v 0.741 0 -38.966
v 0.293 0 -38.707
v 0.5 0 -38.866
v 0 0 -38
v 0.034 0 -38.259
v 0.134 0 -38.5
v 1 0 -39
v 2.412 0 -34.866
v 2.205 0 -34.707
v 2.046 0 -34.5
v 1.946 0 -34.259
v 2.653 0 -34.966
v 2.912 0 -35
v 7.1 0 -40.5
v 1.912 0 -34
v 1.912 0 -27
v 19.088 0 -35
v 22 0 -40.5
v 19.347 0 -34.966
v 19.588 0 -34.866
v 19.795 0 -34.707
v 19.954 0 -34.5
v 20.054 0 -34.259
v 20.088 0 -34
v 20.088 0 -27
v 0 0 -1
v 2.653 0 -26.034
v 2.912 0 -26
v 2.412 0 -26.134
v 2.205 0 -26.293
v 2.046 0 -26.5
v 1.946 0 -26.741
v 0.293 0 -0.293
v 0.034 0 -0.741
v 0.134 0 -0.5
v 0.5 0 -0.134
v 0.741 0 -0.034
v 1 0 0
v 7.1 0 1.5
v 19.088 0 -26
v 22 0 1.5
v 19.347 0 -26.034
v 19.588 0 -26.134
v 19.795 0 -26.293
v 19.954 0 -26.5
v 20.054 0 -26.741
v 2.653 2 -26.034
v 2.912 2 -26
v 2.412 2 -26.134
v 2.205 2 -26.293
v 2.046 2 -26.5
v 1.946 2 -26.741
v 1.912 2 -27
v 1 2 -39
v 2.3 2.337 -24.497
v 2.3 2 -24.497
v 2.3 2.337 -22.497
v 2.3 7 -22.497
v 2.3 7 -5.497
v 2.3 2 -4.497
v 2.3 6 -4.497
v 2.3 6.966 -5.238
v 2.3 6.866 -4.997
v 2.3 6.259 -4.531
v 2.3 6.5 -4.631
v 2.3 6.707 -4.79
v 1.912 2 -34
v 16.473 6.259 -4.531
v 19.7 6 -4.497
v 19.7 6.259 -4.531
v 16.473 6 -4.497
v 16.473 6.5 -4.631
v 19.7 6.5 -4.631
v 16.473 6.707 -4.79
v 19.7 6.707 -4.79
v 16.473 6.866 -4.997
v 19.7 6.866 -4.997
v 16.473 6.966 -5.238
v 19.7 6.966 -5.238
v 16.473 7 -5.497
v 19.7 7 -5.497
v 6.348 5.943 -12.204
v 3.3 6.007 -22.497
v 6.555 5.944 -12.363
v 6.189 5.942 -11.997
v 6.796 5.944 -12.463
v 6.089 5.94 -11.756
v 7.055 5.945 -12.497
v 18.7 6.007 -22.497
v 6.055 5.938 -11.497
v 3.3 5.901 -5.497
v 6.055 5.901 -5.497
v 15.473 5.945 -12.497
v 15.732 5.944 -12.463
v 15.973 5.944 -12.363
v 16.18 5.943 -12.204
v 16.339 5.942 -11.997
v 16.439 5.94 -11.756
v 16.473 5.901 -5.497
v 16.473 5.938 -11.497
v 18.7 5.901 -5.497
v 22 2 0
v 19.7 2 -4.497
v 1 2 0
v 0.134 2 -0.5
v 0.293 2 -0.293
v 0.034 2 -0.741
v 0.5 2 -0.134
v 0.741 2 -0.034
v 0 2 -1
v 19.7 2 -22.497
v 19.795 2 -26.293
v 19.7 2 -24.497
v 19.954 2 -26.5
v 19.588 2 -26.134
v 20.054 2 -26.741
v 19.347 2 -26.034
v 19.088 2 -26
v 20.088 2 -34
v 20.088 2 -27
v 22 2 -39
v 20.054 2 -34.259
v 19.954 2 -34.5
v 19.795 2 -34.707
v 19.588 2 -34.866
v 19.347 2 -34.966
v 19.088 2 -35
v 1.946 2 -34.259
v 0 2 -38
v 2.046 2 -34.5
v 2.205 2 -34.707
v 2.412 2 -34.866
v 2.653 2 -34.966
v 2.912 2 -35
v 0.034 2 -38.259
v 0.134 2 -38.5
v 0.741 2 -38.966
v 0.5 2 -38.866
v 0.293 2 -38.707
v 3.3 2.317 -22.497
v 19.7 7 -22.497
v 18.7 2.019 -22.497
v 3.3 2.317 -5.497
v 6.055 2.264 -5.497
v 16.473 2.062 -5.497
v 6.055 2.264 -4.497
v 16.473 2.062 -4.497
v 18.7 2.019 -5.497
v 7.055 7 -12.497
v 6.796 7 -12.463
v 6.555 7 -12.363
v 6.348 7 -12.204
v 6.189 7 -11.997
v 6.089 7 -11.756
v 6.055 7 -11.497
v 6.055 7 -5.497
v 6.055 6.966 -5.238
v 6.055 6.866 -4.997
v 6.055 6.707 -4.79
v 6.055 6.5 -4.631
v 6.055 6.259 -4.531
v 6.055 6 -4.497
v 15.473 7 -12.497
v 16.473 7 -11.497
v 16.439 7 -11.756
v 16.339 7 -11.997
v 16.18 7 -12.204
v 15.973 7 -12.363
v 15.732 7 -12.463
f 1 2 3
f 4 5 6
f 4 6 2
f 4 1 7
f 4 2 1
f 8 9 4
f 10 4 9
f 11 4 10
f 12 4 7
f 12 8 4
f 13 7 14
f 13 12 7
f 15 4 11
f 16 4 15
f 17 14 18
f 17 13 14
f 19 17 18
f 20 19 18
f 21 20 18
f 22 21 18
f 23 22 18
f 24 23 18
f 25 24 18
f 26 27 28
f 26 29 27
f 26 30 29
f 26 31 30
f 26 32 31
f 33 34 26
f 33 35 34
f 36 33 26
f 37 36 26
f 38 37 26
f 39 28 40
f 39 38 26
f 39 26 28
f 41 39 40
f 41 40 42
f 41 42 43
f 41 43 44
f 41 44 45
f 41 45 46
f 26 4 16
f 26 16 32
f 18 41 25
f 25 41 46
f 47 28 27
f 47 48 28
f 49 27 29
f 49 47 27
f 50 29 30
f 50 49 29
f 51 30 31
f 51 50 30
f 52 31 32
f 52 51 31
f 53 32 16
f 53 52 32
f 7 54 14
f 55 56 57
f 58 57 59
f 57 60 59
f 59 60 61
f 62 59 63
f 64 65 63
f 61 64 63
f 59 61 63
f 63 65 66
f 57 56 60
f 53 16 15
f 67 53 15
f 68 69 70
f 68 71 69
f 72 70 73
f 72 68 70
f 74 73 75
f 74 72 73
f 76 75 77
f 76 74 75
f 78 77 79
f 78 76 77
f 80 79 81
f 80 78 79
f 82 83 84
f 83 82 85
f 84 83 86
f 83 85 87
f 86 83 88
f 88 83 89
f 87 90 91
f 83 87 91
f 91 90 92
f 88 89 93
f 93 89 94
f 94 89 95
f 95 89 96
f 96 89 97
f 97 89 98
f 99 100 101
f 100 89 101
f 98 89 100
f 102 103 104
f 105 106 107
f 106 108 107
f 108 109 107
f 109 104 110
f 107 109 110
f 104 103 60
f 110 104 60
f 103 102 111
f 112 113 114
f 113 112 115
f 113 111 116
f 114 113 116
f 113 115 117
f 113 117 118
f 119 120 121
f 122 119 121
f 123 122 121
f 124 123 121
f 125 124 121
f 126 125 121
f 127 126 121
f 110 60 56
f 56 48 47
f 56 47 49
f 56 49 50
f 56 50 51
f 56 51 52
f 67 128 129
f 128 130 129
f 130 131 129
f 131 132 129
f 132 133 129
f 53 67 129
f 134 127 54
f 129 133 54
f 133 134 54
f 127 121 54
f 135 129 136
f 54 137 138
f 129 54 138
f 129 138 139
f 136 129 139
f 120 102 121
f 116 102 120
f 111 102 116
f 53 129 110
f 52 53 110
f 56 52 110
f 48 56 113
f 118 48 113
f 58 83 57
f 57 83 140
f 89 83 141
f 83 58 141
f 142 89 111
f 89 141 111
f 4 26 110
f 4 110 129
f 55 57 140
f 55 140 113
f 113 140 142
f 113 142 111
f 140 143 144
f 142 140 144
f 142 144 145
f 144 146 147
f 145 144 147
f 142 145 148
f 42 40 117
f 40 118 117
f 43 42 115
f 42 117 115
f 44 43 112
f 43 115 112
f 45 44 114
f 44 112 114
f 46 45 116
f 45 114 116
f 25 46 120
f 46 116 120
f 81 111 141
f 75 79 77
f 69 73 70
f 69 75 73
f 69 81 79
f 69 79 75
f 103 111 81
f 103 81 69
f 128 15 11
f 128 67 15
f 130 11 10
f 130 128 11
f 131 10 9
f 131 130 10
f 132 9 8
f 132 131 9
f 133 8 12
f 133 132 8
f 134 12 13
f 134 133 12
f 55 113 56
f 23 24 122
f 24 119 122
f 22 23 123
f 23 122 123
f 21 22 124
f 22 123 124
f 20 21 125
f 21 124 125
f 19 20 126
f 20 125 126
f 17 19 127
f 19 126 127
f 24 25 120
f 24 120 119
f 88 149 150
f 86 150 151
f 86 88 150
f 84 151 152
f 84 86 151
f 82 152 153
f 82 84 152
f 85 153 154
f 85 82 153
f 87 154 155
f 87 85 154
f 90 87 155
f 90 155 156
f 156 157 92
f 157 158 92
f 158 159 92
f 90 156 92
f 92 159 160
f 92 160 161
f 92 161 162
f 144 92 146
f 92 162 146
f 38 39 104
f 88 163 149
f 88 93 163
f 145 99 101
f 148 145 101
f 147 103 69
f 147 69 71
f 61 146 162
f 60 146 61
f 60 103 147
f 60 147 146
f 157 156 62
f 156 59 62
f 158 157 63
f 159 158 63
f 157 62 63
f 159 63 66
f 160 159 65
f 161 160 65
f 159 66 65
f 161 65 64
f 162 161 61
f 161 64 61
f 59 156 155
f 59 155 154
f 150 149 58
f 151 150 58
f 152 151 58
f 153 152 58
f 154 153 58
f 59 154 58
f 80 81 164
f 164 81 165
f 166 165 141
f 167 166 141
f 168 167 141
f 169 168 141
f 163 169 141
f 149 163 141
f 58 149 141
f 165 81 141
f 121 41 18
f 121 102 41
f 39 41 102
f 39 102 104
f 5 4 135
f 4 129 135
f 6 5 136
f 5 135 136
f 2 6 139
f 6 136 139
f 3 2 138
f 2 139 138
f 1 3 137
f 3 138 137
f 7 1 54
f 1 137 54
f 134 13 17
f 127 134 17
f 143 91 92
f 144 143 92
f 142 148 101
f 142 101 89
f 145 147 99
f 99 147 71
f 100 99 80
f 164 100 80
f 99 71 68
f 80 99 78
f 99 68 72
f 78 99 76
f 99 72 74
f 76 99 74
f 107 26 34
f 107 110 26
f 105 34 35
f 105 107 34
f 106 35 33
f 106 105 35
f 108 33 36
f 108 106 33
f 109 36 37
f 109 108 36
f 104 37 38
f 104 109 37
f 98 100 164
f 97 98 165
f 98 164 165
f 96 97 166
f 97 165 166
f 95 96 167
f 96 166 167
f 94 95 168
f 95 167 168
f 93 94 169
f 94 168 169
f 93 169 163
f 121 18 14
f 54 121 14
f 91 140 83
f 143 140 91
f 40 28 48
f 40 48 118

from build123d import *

# Parameters (mm, degrees)
CROQUIS1_W              = 22
CROQUIS1_H              = 39
CROQUIS1_W_2            = 18.17669517928964
CROQUIS1_H_2            = 8.999999999999996
SALIENTE_EXTRUIR1_DEPTH = 2
REDONDEO1_R             = 1
REDONDEO2_R             = 1
SALIENTE_EXTRUIR2_DEPTH = 5
SALIENTE_EXTRUIR4_DEPTH = 15.4
CORTAR_EXTRUIR2_DEPTH   = 8
REDONDEO3_R             = 1
SALIENTE_EXTRUIR5_DEPTH = 20.000000000000004
SALIENTE_EXTRUIR6_DEPTH = 14.9
SALIENTE_EXTRUIR7_DEPTH = 14.9
SALIENTE_EXTRUIR8_DEPTH = 2
CORTAR_EXTRUIR3_DEPTH   = 7
SALIENTE_EXTRUIR9_DEPTH = 2
CORTAR_EXTRUIR4_DEPTH   = 8


with BuildPart() as part:
    # Croquis1 → Saliente-Extruir1 (new body)
    with BuildSketch(Plane(origin=(0, 0, 0), x_dir=(1, 0, 0), z_dir=(0, 1, 0))):
        with Locations((11, 19.5)):
            Rectangle(CROQUIS1_W, CROQUIS1_H)
        with Locations((11.000000000000002, 30.5)):
            Rectangle(CROQUIS1_W_2, CROQUIS1_H_2, mode=Mode.SUBTRACT)
        Polygon((2.2999999999999914, 4.496684869244013), (19.7, 4.496684869244013), (19.7, 22.496684869244014), (18.7, 22.496684869244014), (18.7, 5.496684869244012), (3.299999999999997, 5.496684869244012), (3.299999999999997, 22.49668486924401), (2.2999999999999914, 22.49668486924401), align=None, mode=Mode.SUBTRACT)
    extrude(amount=SALIENTE_EXTRUIR1_DEPTH)

    # Redondeo1
    redondeo1_edges = [part.edges().sort_by_distance(p)[0] for p in [
        (0, 1, -39),
        (0, 1, 0),
    ]]
    fillet(redondeo1_edges, radius=REDONDEO1_R)

    # Redondeo2
    redondeo2_edges = [part.edges().sort_by_distance(p)[0] for p in [
        (1.9116524103551802, 1, -35),
        (1.9116524103551802, 1, -26.000000000000004),
        (20.088347589644822, 1, -26.000000000000004),
        (20.088347589644822, 1, -35),
    ]]
    fillet(redondeo2_edges, radius=REDONDEO2_R)



with BuildPart() as body_2:
    # Croquis8 → Saliente-Extruir2 (new body)
    with BuildSketch(Plane(origin=(0, 2, 0), x_dir=(1, 0, 0), z_dir=(0, 1, 0))):
        Polygon((2.2999999999999914, 22.49668486924401), (3.299999999999997, 22.49668486924401), (3.299999999999997, 5.496684869244012), (18.7, 5.496684869244012), (18.7, 22.496684869244014), (19.7, 22.496684869244014), (19.7, 4.496684869244013), (2.2999999999999914, 4.496684869244013), align=None)
    extrude(amount=SALIENTE_EXTRUIR2_DEPTH)

    # Croquis3D1 → Saliente-Extruir4 (add)
    with BuildSketch(Plane(origin=(18.7, 6.007354442998164, -22.496684869244014), x_dir=(0, 0.058291627055225136, 0.9982995974231657), z_dir=(1, 0, 0))):
        Polygon((0, 0), (16.964879958528087, 1.097364583913252), (17.028956080800597, 0), (0.05786292460677727, -0.9909576599388273), align=None)
    extrude(amount=-SALIENTE_EXTRUIR4_DEPTH)

    # Croquis3D2 → Cortar-Extruir2 (cut)
    with BuildSketch(Plane(origin=(6.0546274348603735, 7, -4.496684869244013), x_dir=(0.9015563394045935, -0.4326617233814304, 0), z_dir=(0, 0, -1))):
        Polygon((0, 0), (2.1633086169071523, 4.507781697022968), (11.556372403185868, 0), (9.393063786278717, -4.507781697022968), align=None)
    extrude(amount=CORTAR_EXTRUIR2_DEPTH, mode=Mode.SUBTRACT)

    # Redondeo3
    redondeo3_edges = [body_2.edges().sort_by_distance(p)[0] for p in [
        (6.0546274348603735, 6.4723277606850065, -12.496684869244014),
        (16.47334823547289, 6.4723277606850065, -12.496684869244014),
        (18.086674117736443, 7, -4.496684869244013),
        (4.177313717430181, 7, -4.496684869244013),
    ]]
    fillet(redondeo3_edges, radius=REDONDEO3_R)


with BuildPart() as part_1:
    add(part.part)

    add(body_2.part)  # Saliente-Extruir5 merges body 2
    # Croquis15 → Saliente-Extruir5 (add)
    with BuildSketch(Plane(origin=(0, 0, -4.496684869244013), x_dir=(-1, 0, 0), z_dir=(0, 0, -1))):
        Polygon((-19.7, 2), (-19.7, 0), (-2.2999999999999914, 0), (-2.2999999999999914, 2.336560166952495), align=None)
    extrude(amount=SALIENTE_EXTRUIR5_DEPTH)

    # Croquis16 → Saliente-Extruir6 (add)
    with BuildSketch(Plane(origin=(22, 0, 0), x_dir=(0, 0, -1), z_dir=(1, 0, 0))):
        Polygon((0, 0), (-1.5, -1.8e-16), (0, 2), align=None)
    extrude(amount=-SALIENTE_EXTRUIR6_DEPTH)

    # Croquis17 → Saliente-Extruir7 (add)
    with BuildSketch(Plane(origin=(22, 0, 0), x_dir=(0, 0, -1), z_dir=(1, 0, 0))):
        Polygon((39, 0), (40.5, 0), (39, 2), align=None)
    extrude(amount=-SALIENTE_EXTRUIR7_DEPTH)

    # Croquis18 → Saliente-Extruir8 (add)
    with BuildSketch(Plane.XZ):
        Polygon((7.099999999999999, 1.5), (0.9999999999999966, 0), (7.099999999999999, 0), align=None)
    extrude(amount=-SALIENTE_EXTRUIR8_DEPTH)

    # Croquis20 → Cortar-Extruir3 (cut)
    with BuildSketch(Plane(origin=(7.099999999999999, 0, 0), x_dir=(0, 0, -1), z_dir=(1, 0, 0))):
        Polygon((0, 2), (-1.5, 2), (-1.5, 0), align=None)
    extrude(amount=-CORTAR_EXTRUIR3_DEPTH, mode=Mode.SUBTRACT)

    # Croquis22 → Saliente-Extruir9 (add)
    with BuildSketch(Plane(origin=(0, 2, 0), x_dir=(1, 0, 0), z_dir=(0, 1, 0))):
        Polygon((7.099999999999999, 40.5), (7.099999999999999, 39), (1, 39), align=None)
    extrude(amount=-SALIENTE_EXTRUIR9_DEPTH)

    # Croquis23 → Cortar-Extruir4 (cut)
    with BuildSketch(Plane(origin=(7.099999999999999, 0, 0), x_dir=(0, 0, -1), z_dir=(1, 0, 0))):
        Polygon((40.5, 0), (39, 2), (40.5, 2), align=None)
    extrude(amount=-CORTAR_EXTRUIR4_DEPTH, mode=Mode.SUBTRACT)


solid = part_1.part
